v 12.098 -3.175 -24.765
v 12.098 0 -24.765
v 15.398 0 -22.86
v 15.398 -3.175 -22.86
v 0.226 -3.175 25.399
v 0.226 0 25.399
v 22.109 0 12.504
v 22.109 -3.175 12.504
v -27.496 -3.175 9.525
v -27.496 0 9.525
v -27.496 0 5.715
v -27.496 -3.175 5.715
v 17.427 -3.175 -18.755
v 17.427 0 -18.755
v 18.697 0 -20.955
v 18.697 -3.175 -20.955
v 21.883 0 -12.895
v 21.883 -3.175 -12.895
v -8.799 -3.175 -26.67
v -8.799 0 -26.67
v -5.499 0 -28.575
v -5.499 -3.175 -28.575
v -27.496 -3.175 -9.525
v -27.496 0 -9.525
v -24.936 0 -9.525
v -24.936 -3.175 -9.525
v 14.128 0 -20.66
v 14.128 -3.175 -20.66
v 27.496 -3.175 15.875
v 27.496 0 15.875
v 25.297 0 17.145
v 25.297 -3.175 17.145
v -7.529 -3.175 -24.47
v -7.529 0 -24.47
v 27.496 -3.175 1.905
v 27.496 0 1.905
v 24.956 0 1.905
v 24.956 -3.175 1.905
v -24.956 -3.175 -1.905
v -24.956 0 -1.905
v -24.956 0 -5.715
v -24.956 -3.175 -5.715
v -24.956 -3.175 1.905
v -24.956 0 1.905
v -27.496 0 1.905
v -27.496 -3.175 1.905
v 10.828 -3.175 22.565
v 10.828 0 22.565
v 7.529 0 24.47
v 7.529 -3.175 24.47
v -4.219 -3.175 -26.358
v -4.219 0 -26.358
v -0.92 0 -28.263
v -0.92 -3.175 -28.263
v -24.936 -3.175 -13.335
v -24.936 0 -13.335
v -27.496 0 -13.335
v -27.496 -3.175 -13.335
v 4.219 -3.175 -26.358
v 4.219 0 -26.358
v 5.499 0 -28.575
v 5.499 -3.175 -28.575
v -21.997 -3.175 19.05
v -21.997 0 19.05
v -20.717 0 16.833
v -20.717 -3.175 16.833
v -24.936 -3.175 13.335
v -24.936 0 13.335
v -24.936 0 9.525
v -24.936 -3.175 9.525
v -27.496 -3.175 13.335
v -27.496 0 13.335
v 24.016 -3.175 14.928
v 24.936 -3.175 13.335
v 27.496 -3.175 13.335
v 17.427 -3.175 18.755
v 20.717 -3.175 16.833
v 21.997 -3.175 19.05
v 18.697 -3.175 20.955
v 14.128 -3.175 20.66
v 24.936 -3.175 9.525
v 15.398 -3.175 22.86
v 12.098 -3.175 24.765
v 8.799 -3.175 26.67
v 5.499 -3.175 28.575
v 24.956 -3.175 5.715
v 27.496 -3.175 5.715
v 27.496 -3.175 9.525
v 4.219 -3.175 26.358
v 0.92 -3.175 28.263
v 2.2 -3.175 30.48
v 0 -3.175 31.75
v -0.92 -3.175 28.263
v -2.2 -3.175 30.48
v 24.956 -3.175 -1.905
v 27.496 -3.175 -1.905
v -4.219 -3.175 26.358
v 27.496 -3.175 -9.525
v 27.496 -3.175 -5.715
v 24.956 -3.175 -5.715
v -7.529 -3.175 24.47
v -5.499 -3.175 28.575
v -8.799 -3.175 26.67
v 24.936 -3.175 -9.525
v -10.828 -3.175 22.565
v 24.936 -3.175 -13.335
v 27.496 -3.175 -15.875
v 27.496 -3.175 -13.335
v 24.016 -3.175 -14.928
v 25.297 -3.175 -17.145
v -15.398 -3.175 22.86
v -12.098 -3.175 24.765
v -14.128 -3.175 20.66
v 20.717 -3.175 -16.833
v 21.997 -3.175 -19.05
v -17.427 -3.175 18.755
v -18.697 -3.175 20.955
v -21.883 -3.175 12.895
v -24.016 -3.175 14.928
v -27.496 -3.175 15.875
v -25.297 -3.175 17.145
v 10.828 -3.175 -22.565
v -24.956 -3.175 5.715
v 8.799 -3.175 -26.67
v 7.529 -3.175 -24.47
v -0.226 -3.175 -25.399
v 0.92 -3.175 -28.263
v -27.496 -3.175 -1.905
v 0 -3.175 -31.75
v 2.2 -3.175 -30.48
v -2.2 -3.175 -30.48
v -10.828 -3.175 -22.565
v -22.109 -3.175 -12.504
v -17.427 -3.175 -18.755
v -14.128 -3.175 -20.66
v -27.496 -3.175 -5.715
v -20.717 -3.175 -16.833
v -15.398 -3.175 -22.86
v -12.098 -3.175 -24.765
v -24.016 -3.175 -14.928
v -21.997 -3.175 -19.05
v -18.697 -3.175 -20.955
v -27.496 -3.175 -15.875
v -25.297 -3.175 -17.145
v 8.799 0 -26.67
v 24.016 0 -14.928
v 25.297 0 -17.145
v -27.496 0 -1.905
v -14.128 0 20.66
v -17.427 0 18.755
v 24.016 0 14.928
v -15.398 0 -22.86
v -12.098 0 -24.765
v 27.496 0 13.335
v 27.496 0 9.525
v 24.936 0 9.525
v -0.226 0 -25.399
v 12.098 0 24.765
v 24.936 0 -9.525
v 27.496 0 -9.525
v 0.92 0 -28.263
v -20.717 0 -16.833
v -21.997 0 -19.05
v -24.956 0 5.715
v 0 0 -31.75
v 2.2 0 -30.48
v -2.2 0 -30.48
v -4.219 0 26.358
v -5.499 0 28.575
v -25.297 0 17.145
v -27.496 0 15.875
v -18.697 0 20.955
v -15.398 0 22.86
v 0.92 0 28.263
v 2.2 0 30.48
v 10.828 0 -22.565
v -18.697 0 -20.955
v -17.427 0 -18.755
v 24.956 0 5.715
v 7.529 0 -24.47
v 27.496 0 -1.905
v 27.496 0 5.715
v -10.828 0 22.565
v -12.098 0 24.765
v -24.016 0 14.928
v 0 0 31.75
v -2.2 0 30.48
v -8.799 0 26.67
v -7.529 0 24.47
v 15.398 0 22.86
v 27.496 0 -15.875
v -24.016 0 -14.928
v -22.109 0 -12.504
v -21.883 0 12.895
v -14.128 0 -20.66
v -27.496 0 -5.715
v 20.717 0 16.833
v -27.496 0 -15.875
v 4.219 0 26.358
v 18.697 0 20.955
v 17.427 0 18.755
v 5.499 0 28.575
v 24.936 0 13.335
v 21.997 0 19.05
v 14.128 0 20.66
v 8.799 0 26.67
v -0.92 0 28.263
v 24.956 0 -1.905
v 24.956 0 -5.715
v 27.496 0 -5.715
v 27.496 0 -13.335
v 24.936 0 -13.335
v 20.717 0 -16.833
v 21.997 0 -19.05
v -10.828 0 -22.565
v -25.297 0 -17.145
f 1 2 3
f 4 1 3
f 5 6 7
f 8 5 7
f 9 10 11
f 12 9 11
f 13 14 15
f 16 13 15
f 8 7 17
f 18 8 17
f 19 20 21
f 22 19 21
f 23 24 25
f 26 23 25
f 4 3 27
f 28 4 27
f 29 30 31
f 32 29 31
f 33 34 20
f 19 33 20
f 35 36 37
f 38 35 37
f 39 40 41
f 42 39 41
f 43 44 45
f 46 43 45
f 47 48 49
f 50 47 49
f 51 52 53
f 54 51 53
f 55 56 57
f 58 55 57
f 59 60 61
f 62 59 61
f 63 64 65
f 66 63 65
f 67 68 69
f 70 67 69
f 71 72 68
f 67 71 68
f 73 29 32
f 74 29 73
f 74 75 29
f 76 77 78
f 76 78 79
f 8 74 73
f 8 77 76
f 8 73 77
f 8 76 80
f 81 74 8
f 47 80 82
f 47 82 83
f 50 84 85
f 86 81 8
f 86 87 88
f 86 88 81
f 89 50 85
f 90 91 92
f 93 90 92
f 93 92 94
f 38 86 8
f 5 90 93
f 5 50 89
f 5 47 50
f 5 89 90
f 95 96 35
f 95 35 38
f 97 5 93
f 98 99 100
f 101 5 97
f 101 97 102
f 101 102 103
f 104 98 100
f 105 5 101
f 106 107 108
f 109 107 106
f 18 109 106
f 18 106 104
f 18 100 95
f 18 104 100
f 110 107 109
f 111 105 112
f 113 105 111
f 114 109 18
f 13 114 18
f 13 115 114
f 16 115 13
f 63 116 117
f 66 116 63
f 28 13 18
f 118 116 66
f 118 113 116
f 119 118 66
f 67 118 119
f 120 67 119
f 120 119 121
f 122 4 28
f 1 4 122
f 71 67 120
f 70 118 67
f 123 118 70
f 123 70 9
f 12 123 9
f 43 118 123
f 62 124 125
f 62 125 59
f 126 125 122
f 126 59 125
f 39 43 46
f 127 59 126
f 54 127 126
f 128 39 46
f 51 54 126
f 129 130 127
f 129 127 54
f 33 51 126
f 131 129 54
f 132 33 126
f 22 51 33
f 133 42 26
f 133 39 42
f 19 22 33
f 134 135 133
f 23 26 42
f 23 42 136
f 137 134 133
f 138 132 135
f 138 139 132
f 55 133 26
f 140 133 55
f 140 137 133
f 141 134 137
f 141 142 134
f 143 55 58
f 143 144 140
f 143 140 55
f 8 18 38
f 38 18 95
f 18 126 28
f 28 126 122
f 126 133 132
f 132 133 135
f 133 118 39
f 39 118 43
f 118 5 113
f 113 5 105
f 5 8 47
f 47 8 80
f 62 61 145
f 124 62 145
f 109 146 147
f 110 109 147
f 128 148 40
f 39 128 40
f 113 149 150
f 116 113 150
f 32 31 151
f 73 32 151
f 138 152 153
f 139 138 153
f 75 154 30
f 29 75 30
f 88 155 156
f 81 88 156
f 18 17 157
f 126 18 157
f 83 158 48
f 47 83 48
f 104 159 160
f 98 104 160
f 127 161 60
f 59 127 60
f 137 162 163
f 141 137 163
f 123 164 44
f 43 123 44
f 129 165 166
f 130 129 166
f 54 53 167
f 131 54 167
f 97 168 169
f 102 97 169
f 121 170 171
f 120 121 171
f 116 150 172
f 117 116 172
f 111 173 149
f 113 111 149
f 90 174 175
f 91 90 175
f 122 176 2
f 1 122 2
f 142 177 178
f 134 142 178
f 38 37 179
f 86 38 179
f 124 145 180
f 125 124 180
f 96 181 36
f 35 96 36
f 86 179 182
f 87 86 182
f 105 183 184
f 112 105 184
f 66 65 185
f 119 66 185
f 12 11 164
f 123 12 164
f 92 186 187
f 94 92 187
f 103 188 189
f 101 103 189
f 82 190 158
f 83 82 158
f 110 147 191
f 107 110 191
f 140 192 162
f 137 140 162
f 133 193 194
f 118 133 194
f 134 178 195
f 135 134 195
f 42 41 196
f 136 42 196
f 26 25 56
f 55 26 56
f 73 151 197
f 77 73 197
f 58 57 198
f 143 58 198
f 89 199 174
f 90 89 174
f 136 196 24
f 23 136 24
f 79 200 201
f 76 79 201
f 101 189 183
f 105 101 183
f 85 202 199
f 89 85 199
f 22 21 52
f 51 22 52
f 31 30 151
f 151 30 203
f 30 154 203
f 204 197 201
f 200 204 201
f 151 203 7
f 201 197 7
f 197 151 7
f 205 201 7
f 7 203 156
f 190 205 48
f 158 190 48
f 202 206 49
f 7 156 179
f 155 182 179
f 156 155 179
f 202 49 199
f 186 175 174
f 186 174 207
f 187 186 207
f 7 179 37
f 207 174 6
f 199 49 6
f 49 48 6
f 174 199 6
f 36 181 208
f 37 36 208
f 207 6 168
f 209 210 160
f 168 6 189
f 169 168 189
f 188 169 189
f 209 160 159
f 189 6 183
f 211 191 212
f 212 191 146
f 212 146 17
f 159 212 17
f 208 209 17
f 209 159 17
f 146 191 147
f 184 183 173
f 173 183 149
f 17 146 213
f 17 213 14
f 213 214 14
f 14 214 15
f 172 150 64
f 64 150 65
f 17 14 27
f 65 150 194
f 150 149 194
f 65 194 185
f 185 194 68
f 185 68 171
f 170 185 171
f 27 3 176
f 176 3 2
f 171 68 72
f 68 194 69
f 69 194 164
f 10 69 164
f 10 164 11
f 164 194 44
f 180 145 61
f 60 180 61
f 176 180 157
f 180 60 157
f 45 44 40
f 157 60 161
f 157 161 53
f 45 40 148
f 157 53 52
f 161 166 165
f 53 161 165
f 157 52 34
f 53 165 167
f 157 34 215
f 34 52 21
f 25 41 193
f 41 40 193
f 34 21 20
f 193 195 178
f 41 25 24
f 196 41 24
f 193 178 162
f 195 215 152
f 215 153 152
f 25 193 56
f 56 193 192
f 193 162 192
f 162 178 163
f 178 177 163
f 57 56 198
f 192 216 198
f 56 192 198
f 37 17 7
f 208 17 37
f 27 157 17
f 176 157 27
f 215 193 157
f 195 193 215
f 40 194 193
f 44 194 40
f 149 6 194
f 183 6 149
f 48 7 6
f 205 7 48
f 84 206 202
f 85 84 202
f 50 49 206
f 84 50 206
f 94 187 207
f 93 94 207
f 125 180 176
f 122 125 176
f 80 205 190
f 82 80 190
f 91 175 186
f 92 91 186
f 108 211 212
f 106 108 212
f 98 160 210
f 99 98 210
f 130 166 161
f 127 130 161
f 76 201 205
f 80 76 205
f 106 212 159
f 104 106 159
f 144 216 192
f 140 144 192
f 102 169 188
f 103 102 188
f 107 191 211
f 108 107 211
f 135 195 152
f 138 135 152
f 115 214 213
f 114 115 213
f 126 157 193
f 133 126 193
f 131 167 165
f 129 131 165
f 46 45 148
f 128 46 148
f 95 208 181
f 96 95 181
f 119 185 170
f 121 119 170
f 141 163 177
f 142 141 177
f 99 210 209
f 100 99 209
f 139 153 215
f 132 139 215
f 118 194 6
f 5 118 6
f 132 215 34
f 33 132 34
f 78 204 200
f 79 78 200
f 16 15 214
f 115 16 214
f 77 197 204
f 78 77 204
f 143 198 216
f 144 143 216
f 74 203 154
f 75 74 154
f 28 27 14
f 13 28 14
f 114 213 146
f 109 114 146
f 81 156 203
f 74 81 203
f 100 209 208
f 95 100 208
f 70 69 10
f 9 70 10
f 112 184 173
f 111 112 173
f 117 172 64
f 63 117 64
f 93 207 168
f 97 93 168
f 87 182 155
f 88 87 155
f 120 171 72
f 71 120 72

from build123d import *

# Parameters (mm, degrees)
BOSS_EXTRUDE1_DEPTH = 3.175


with BuildPart() as part:
    # Sketch1 → Boss-Extrude1 (new body)
    with BuildSketch(Plane(origin=(0, 0, 0), x_dir=(1, 0, 0), z_dir=(0, 1, 0))):
        Polygon((-27.49630657, 15.875), (-25.296602045, 17.145), (-24.016404155, 14.927632211), (-20.716847366, 16.832632211), (-21.997045256, 19.05), (-18.697488468, 20.955), (-17.427488468, 18.755295474), (-14.127931679, 20.660295474), (-15.397931679, 22.86), (-12.098374891, 24.765), (-10.828374891, 22.565295474), (-7.528818102, 24.470295474), (-8.798818102, 26.67), (-5.499261314, 28.575), (-4.219063424, 26.357632211), (-0.919506636, 28.262632211), (-2.199704526, 30.48), (0, 31.75), (2.199704526, 30.48), (0.919506636, 28.262632211), (4.219063424, 26.357632211), (5.499261314, 28.575), (8.798818102, 26.67), (7.528818102, 24.470295474), (10.828374891, 22.565295474), (12.098374891, 24.765), (15.397931679, 22.86), (14.127931679, 20.660295474), (17.427488468, 18.755295474), (18.697488468, 20.955), (21.997045256, 19.05), (20.716847366, 16.832632211), (24.016404155, 14.927632211), (25.296602045, 17.145), (27.49630657, 15.875), (27.49630657, 13.335), (24.935910791, 13.335), (24.935910791, 9.525), (27.49630657, 9.525), (27.49630657, 5.715), (24.95630657, 5.715), (24.95630657, 1.905), (27.49630657, 1.905), (27.49630657, -1.905), (24.95630657, -1.905), (24.95630657, -5.715), (27.49630657, -5.715), (27.49630657, -9.525), (24.935910791, -9.525), (24.935910791, -13.335), (27.49630657, -13.335), (27.49630657, -15.875), (25.296602045, -17.145), (24.016404155, -14.927632211), (20.716847366, -16.832632211), (21.997045256, -19.05), (18.697488468, -20.955), (17.427488468, -18.755295474), (14.127931679, -20.660295474), (15.397931679, -22.86), (12.098374891, -24.765), (10.828374891, -22.565295474), (7.528818102, -24.470295474), (8.798818102, -26.67), (5.499261314, -28.575), (4.219063424, -26.357632211), (0.919506636, -28.262632211), (2.199704526, -30.48), (0, -31.75), (-2.199704526, -30.48), (-0.919506636, -28.262632211), (-4.219063424, -26.357632211), (-5.499261314, -28.575), (-8.798818102, -26.67), (-7.528818102, -24.470295474), (-10.828374891, -22.565295474), (-12.098374891, -24.765), (-15.397931679, -22.86), (-14.127931679, -20.660295474), (-17.427488468, -18.755295474), (-18.697488468, -20.955), (-21.997045256, -19.05), (-20.716847366, -16.832632211), (-24.016404155, -14.927632211), (-25.296602045, -17.145), (-27.49630657, -15.875), (-27.49630657, -13.335), (-24.935910791, -13.335), (-24.935910791, -9.525), (-27.49630657, -9.525), (-27.49630657, -5.715), (-24.95630657, -5.715), (-24.95630657, -1.905), (-27.49630657, -1.905), (-27.49630657, 1.905), (-24.95630657, 1.905), (-24.95630657, 5.715), (-27.49630657, 5.715), (-27.49630657, 9.525), (-24.935910791, 9.525), (-24.935910791, 13.335), (-27.49630657, 13.335), align=None)
        Polygon((21.883093223, 12.895356956), (-0.226160103, 25.398993122), (-22.109253326, 12.503636166), (-21.883093223, -12.895356956), (0.226160103, -25.398993122), (22.109253326, -12.503636166), align=None, mode=Mode.SUBTRACT)
    extrude(amount=-BOSS_EXTRUDE1_DEPTH)


solid = part.part
